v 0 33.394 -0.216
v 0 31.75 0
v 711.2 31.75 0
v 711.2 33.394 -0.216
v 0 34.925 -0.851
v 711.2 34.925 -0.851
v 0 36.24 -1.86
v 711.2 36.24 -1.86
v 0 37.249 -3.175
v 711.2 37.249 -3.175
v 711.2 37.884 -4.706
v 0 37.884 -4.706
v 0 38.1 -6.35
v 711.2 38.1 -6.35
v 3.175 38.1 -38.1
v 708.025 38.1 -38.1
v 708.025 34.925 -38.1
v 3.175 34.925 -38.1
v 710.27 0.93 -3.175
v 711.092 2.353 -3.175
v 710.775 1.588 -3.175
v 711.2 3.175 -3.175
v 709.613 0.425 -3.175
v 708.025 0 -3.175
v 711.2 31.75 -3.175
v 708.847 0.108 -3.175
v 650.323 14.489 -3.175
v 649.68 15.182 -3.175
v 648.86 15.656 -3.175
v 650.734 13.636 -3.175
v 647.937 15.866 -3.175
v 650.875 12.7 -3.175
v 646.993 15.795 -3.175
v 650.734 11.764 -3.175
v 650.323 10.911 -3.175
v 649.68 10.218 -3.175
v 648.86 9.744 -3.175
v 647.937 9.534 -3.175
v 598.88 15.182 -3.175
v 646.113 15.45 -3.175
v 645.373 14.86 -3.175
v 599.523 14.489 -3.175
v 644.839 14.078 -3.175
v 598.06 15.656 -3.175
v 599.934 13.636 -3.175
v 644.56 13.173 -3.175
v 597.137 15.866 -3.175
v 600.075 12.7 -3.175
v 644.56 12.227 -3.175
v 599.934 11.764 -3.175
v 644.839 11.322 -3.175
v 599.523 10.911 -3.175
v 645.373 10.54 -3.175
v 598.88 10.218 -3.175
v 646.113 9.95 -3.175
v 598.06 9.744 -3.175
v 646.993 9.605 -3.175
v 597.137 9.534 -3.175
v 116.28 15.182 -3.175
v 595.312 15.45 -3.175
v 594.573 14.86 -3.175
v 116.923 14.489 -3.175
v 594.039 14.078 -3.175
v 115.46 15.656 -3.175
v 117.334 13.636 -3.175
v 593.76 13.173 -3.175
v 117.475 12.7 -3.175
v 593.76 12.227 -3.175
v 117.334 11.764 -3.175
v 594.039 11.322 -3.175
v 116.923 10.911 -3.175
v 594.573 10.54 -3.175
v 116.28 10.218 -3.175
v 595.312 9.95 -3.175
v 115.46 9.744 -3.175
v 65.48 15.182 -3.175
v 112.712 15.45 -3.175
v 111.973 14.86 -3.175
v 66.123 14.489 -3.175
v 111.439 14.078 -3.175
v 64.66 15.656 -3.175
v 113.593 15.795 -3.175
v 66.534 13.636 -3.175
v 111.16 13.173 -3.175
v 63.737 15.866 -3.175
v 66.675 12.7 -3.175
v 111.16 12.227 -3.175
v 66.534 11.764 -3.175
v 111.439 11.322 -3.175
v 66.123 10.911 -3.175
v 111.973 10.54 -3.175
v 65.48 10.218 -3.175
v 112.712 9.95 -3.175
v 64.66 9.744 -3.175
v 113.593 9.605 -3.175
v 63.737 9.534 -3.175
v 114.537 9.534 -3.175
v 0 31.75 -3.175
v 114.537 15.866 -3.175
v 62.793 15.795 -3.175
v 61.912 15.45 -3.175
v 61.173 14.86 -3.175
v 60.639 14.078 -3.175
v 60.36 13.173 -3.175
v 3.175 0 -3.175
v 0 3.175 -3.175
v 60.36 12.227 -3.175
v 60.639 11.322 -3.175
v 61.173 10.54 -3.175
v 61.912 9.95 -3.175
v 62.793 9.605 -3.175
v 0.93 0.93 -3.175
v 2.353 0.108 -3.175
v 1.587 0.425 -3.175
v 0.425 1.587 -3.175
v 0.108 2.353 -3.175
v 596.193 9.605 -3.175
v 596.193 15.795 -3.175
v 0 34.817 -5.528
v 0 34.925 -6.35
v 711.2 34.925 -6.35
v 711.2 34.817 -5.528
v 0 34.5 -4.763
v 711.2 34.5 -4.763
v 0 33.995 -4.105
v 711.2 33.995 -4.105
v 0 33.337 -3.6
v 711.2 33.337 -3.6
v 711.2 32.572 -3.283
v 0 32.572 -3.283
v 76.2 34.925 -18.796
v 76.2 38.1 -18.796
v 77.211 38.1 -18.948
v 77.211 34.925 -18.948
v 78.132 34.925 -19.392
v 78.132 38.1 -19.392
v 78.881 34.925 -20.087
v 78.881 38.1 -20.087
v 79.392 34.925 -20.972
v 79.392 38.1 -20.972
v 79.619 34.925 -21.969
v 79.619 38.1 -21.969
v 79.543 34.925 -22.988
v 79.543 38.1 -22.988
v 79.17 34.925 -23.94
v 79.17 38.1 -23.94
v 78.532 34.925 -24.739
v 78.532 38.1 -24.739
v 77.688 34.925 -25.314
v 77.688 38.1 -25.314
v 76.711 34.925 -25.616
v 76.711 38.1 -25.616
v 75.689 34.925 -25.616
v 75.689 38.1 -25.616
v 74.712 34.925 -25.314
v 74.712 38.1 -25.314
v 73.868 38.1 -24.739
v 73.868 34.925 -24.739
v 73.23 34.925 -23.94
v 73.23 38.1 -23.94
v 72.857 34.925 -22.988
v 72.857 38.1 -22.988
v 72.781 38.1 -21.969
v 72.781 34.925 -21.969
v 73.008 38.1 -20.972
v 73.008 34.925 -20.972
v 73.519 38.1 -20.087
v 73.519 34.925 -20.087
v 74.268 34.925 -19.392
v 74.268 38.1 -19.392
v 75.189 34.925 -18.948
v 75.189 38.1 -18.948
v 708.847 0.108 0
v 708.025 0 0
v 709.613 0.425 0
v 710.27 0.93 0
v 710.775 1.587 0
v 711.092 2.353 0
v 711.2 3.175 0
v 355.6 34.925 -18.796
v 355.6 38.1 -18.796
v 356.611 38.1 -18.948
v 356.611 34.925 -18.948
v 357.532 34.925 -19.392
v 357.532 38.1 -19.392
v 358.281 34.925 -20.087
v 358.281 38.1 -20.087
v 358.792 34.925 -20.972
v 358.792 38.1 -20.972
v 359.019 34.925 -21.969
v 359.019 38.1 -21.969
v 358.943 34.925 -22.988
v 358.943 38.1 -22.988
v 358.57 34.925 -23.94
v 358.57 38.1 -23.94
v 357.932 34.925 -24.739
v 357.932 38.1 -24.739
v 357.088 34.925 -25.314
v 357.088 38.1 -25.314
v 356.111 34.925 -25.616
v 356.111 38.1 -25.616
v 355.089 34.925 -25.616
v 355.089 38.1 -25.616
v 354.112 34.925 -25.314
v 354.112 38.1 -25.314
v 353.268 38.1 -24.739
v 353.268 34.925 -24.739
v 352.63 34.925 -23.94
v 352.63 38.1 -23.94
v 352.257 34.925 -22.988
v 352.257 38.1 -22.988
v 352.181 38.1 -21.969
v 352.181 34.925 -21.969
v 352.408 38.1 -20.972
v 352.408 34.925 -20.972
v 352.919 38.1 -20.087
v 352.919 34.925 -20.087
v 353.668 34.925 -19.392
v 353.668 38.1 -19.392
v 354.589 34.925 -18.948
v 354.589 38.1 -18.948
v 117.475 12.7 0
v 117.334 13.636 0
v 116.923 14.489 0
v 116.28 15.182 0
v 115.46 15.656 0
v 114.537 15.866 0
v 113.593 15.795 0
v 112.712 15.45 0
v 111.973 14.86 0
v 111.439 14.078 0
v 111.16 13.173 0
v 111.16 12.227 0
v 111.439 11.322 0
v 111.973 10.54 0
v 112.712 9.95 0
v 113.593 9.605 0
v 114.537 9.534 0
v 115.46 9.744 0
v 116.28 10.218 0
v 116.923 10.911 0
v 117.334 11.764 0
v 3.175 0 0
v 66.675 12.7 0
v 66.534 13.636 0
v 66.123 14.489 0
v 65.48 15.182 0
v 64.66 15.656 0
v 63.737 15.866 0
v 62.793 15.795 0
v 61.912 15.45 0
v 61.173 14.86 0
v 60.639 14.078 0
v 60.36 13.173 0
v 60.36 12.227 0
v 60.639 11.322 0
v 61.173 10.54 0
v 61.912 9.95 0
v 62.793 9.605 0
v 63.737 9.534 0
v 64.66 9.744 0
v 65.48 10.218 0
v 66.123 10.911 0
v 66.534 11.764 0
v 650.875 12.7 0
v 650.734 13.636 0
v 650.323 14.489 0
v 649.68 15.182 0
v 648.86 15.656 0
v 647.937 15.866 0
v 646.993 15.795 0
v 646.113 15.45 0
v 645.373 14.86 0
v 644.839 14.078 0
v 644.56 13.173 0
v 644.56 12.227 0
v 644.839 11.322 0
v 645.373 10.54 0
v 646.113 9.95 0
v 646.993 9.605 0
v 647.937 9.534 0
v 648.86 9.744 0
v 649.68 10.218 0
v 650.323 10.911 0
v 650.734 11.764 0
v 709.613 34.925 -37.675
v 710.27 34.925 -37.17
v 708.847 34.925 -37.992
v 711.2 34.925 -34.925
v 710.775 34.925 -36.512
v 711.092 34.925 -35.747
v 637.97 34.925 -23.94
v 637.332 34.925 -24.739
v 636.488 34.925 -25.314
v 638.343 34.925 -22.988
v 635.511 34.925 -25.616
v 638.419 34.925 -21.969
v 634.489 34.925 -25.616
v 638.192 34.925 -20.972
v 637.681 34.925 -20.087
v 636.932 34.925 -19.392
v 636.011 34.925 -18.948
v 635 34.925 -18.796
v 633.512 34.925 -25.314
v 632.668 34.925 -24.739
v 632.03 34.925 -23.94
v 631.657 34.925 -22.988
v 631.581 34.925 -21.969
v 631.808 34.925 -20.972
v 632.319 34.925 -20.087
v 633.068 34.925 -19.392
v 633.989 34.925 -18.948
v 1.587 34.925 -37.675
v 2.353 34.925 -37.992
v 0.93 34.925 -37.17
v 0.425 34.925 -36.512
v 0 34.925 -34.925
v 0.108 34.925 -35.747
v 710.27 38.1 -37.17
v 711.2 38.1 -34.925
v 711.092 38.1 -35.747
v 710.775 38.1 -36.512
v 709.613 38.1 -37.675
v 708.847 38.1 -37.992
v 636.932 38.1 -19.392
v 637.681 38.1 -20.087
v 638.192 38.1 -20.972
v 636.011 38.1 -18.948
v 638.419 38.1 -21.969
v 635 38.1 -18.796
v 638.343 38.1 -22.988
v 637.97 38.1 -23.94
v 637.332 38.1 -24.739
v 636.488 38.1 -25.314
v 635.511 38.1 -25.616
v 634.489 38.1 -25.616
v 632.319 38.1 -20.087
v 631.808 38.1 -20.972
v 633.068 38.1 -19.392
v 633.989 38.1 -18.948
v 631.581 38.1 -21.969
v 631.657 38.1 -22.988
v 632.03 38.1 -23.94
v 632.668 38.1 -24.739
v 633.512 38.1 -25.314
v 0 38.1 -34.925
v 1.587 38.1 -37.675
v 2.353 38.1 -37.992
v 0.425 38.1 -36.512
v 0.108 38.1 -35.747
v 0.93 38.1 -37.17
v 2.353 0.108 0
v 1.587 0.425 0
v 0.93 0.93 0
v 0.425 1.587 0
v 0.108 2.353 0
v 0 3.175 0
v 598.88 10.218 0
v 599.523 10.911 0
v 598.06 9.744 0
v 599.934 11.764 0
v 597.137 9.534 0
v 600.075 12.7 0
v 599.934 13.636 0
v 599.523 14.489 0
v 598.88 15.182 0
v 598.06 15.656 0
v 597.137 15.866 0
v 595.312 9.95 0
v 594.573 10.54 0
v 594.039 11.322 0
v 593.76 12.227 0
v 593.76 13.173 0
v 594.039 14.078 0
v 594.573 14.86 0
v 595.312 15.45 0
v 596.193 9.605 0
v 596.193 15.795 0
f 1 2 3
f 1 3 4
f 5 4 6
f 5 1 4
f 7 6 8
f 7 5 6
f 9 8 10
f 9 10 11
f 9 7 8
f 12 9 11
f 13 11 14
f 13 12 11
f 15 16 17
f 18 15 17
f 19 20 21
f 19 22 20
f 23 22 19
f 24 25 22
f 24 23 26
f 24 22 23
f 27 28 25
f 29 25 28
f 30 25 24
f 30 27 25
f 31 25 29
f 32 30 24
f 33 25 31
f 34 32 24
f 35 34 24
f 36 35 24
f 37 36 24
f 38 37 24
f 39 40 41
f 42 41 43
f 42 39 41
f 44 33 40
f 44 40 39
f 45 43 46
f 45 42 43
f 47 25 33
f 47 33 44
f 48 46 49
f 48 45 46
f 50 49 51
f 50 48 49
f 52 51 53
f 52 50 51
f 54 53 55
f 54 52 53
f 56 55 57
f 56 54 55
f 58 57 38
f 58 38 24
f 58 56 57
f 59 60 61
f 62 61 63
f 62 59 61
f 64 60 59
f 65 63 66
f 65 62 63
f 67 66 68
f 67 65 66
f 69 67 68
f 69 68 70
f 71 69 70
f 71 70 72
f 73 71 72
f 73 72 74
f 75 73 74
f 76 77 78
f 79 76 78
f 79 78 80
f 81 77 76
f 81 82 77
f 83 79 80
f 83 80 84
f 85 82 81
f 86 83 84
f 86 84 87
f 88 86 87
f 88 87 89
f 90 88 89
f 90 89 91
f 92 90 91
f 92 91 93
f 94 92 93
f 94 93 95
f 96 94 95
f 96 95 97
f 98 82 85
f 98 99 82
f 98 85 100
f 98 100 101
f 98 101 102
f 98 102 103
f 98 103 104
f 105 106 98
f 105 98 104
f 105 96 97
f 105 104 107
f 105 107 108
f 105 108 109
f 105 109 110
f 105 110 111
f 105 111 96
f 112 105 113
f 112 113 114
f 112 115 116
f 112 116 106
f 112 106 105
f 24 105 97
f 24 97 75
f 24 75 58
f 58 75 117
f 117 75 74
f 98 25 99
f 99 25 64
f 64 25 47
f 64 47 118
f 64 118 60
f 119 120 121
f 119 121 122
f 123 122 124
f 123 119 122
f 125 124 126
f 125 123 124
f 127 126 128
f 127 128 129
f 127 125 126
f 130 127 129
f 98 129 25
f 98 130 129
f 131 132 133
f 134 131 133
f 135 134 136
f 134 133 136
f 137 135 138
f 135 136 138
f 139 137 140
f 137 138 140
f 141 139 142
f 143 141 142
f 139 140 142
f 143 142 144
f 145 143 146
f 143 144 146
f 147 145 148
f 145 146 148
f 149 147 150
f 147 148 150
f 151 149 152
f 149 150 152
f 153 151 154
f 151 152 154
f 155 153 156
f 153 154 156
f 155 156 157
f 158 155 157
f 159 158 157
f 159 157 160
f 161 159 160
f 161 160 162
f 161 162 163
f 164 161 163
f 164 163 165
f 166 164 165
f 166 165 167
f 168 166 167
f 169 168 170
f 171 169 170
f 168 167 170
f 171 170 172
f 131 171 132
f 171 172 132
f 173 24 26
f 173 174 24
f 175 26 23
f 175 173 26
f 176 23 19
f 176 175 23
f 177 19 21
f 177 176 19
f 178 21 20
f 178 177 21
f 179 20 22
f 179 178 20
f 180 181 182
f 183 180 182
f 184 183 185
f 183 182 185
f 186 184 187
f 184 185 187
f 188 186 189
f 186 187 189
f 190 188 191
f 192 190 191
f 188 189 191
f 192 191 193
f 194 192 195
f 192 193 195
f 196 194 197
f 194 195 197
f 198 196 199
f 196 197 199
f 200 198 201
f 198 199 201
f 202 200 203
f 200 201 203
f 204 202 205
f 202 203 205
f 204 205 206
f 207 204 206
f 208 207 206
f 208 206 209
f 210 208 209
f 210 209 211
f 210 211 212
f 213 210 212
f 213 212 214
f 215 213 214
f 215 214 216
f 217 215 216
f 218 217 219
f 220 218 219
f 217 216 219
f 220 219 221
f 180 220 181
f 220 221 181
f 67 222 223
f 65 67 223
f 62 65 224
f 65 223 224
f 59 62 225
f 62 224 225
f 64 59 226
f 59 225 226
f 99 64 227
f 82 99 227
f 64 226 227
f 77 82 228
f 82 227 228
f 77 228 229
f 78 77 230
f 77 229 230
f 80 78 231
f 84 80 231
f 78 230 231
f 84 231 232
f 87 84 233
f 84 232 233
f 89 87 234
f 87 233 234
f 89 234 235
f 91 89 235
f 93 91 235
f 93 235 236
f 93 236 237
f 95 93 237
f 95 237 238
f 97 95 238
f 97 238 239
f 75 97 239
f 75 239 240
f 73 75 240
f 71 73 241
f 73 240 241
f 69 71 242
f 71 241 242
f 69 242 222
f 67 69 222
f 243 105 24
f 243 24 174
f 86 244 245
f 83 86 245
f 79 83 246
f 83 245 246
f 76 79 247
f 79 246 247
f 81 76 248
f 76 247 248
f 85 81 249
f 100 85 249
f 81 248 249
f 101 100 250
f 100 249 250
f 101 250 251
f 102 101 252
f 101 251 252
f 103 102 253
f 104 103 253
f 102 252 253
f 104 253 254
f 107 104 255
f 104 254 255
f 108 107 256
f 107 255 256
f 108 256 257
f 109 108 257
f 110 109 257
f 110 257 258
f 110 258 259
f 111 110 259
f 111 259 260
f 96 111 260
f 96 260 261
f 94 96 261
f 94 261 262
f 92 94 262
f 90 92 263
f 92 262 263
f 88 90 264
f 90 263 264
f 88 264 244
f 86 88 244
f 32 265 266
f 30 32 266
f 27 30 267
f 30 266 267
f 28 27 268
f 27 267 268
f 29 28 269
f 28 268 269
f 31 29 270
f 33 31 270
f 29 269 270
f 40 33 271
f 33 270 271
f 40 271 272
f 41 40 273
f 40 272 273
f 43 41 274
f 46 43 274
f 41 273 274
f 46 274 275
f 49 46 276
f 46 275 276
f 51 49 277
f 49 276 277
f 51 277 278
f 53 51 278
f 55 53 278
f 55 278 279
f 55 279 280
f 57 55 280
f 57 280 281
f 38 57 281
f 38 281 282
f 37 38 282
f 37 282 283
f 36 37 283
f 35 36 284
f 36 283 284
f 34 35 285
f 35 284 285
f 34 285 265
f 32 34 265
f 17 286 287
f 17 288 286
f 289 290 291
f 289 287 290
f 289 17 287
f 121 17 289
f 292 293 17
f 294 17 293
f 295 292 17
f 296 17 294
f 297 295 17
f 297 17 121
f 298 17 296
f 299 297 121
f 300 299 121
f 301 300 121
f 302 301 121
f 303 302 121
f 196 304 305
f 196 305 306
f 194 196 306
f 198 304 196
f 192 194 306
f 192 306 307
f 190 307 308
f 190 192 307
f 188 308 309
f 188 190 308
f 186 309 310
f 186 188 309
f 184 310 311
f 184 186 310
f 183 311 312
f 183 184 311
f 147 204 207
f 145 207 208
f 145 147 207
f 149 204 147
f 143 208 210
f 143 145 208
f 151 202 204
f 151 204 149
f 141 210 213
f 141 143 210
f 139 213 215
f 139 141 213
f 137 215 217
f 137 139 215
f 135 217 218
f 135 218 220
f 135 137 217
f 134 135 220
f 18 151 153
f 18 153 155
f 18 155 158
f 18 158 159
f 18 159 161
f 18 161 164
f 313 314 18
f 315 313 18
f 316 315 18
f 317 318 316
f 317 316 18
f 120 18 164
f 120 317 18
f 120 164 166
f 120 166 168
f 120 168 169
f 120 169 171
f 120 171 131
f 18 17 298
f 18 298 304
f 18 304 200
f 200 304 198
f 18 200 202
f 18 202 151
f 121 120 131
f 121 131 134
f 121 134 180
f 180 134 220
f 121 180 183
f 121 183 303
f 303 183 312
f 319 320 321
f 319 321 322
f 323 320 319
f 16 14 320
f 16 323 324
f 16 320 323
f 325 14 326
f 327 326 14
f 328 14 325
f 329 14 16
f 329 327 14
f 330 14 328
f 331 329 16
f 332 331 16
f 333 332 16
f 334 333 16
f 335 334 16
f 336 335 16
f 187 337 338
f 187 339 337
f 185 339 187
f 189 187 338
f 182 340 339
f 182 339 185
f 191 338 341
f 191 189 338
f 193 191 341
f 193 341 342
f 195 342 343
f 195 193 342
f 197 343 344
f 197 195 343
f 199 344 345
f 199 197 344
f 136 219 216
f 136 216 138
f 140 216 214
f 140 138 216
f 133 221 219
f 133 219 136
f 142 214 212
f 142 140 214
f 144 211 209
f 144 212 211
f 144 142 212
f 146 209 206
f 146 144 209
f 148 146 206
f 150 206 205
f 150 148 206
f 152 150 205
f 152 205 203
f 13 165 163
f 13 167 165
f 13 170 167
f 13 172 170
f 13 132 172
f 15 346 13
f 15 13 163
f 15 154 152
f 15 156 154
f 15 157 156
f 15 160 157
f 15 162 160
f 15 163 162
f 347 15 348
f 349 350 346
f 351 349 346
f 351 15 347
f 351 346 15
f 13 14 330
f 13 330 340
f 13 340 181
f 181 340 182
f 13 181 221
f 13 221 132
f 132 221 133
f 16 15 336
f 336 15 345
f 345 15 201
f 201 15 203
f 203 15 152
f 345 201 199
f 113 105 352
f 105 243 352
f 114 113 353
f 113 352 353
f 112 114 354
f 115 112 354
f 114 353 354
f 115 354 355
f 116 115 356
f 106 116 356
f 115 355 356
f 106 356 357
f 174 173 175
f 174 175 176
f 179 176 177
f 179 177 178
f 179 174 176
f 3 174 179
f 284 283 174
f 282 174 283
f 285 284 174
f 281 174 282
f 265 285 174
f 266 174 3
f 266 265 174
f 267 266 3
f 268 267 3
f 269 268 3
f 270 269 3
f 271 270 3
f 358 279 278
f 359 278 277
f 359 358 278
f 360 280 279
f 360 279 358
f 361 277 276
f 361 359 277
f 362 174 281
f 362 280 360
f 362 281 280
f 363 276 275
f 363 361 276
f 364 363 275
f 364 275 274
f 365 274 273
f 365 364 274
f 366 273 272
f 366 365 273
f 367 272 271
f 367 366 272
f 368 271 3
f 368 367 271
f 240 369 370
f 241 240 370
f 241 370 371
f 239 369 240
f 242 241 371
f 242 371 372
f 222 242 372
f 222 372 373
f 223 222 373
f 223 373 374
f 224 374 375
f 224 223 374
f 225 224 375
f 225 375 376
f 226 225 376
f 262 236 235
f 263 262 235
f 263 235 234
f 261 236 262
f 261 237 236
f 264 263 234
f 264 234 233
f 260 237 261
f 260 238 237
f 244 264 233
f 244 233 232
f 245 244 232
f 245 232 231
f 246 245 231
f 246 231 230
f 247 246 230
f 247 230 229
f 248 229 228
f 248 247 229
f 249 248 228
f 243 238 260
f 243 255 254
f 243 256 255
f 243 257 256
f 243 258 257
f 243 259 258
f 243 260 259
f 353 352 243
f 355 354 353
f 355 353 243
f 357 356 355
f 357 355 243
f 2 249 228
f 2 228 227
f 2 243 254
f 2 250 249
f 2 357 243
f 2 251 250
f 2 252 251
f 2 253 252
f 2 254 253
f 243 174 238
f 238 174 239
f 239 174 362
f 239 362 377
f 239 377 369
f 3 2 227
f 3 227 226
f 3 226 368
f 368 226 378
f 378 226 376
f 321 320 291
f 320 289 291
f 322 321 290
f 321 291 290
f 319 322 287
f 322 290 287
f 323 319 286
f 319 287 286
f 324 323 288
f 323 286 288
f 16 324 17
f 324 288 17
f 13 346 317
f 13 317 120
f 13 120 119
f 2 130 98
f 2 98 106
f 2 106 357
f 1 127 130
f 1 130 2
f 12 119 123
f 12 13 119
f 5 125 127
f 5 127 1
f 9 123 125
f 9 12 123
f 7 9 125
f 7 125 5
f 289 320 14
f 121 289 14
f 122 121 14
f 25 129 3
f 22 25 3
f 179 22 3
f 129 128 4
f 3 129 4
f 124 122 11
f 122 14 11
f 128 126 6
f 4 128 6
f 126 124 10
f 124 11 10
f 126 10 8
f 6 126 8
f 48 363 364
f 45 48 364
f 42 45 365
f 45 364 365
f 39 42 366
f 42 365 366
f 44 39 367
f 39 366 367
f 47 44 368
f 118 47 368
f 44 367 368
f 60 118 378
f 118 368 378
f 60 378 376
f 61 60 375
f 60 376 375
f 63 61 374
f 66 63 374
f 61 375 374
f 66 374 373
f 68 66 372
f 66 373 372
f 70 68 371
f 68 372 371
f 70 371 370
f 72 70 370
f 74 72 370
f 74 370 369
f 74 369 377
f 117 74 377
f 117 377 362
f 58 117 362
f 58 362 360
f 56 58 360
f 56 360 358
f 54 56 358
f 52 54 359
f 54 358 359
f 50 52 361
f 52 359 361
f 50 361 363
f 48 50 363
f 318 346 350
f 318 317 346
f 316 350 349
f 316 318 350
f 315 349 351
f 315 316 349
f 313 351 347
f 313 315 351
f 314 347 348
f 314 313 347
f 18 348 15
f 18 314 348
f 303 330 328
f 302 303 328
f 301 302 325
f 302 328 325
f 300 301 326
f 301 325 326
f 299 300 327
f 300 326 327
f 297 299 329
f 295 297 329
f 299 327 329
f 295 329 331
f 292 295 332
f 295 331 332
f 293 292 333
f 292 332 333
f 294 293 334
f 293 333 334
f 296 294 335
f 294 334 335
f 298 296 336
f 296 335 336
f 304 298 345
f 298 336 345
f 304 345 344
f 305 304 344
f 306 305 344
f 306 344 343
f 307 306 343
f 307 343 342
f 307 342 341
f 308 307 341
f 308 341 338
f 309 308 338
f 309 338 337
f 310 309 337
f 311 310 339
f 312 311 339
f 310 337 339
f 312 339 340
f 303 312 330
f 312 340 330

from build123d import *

# Parameters (mm, degrees)
BASE_FLANGE1_DEPTH = 711.2
SKETCH18_R         = 3.429
CUT_EXTRUDE1_DEPTH = 3.175
FILLET1_R          = 3.175
SKETCH20_R         = 3.175
CUT_EXTRUDE2_DEPTH = 3.175


# Sheet-metal steps are written as plain solids
with BuildPart() as part:
    # Sketch1 → Base-Flange1 (new body)
    with BuildSketch(Plane(origin=(0, 0, 0), x_dir=(0, 0, -1), z_dir=(1, 0, 0))):
        with BuildLine():
            Line((0, 0), (0, 31.75))
            ThreePointArc((0, 31.75), (1.859871939, 36.240128061), (6.35, 38.1))
            Line((6.35, 38.1), (38.1, 38.1))
            Line((38.1, 38.1), (38.1, 34.925))
            Line((38.1, 34.925), (6.35, 34.925))
            ThreePointArc((6.35, 34.925), (4.10493597, 33.99506403), (3.175, 31.75))
            Line((3.175, 31.75), (3.175, 0))
            Line((3.175, 0), (0, 0))
        make_face()
    extrude(amount=BASE_FLANGE1_DEPTH)

    # Sketch18 → Cut-Extrude1 (cut)
    with BuildSketch(Plane(origin=(0, 38.1, 0), x_dir=(1, 0, 0), z_dir=(0, 1, 0))):
        with Locations(Location((76.2, 22.225, 0), (0, 0, 270))):
            Circle(SKETCH18_R)
        with Locations(Location((355.6, 22.225, 0), (0, 0, 270))):
            Circle(SKETCH18_R)
        with Locations(Location((635, 22.225, 0), (0, 0, 270))):
            Circle(SKETCH18_R)
    extrude(amount=-CUT_EXTRUDE1_DEPTH, mode=Mode.SUBTRACT)

    # Fillet1
    fillet1_edges = [part.edges().sort_by_distance(p)[0] for p in [
        (711.2, 0, -1.5875),
        (0, 0, -1.5875),
        (711.2, 36.5125, -38.1),
        (0, 36.5125, -38.1),
    ]]
    fillet(fillet1_edges, radius=FILLET1_R)

    # Sketch20 → Cut-Extrude2 (cut)
    with BuildSketch(Plane.XY):
        with Locations((63.5, 12.7)):
            Circle(SKETCH20_R)
        with Locations((114.3, 12.7)):
            Circle(SKETCH20_R)
        with Locations((596.9, 12.7)):
            Circle(SKETCH20_R)
        with Locations((647.7, 12.7)):
            Circle(SKETCH20_R)
    extrude(amount=-CUT_EXTRUDE2_DEPTH, mode=Mode.SUBTRACT)


solid = part.part
